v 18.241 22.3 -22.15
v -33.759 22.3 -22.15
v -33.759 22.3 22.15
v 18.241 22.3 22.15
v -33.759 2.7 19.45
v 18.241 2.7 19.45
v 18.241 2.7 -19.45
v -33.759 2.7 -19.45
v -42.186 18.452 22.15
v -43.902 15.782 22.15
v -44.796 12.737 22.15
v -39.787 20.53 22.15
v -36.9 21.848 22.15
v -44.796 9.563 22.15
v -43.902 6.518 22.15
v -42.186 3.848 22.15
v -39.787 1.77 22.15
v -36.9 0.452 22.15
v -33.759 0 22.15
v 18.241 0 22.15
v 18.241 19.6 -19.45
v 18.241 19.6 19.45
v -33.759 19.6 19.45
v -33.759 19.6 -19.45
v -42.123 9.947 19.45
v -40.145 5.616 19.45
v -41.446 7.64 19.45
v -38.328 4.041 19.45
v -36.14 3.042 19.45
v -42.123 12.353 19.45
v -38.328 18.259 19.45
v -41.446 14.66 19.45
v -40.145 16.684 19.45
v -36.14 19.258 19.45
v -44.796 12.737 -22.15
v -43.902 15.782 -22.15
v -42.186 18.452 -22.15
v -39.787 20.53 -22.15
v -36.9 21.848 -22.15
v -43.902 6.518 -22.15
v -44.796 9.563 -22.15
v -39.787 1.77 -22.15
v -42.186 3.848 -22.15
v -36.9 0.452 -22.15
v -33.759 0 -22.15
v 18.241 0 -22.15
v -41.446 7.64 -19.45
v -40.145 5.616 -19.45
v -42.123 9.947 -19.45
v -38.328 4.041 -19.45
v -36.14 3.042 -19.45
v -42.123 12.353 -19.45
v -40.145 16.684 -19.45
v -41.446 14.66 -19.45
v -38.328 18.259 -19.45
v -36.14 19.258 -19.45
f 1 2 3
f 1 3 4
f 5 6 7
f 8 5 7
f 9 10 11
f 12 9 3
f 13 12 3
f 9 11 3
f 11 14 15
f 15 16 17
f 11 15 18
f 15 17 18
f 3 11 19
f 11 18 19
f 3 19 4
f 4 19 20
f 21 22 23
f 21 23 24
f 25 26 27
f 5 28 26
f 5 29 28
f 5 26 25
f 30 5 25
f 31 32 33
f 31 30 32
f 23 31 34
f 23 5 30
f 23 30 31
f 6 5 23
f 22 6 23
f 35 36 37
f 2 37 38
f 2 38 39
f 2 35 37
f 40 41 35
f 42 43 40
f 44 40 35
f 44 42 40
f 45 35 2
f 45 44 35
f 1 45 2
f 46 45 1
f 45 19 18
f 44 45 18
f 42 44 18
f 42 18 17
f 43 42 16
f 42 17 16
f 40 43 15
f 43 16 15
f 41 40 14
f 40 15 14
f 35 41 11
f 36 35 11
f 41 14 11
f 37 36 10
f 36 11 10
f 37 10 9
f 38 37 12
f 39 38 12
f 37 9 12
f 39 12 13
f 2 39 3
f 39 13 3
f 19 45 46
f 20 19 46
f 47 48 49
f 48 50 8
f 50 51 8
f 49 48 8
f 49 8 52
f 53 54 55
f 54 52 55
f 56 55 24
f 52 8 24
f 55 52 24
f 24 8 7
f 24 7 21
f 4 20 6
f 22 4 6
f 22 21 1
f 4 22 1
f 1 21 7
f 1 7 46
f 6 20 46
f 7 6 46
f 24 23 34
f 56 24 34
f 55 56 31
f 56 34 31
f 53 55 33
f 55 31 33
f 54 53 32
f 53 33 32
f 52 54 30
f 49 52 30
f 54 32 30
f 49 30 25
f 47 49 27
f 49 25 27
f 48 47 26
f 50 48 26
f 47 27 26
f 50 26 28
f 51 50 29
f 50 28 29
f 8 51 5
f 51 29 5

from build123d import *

# Parameters (mm, degrees)
ESQUISSE1_W             = 52
ESQUISSE1_H             = 44.3
BOSS_EXTRU_1_DEPTH      = 22.3
ESQUISSE4_W             = 38.9
ESQUISSE4_H             = 16.9
ENL_V_MAT_EXTRU_2_DEPTH = 52
BOSS_EXTRU_3_DEPTH      = 44.3
ENL_V_MAT_EXTRU_4_DEPTH = 38.9


with BuildPart() as part:
    # Esquisse1 → Boss.-Extru.1 (new body)
    with BuildSketch(Plane(origin=(0, 0, 0), x_dir=(1, 0, 0), z_dir=(0, 1, 0))):
        with Locations((-7.759163987, 0)):
            Rectangle(ESQUISSE1_W, ESQUISSE1_H)
    extrude(amount=BOSS_EXTRU_1_DEPTH)

    # Esquisse4 → Enlèv. mat.-Extru.2 (cut)
    with BuildSketch(Plane(origin=(18.240836013, 0, 0), x_dir=(0, 0, -1), z_dir=(1, 0, 0))):
        with Locations((0, 11.15)):
            Rectangle(ESQUISSE4_W, ESQUISSE4_H)
    extrude(amount=-ENL_V_MAT_EXTRU_2_DEPTH, mode=Mode.SUBTRACT)

    # Esquisse5 → Boss.-Extru.3 (add)
    with BuildSketch(Plane.XY.offset(22.15)):
        with BuildLine():
            Line((-33.759163987, 22.3), (-33.759163987, 0))
            ThreePointArc((-33.759163987, 0), (-44.909163987, 11.15), (-33.759163987, 22.3))
        make_face()
    extrude(amount=-BOSS_EXTRU_3_DEPTH)

    # Esquisse8 → Enlèv. mat.-Extru.4 (cut)
    with BuildSketch(Plane(origin=(0, 0, 19.45), x_dir=(-1, 0, 0), z_dir=(0, 0, -1))):
        with BuildLine():
            Line((33.759163987, 2.700004998), (33.759163987, 19.599995002))
            ThreePointArc((33.759163987, 19.599995002), (42.209158989, 11.15), (33.759163987, 2.700004998))
        make_face()
    extrude(amount=ENL_V_MAT_EXTRU_4_DEPTH, mode=Mode.SUBTRACT)


solid = part.part
